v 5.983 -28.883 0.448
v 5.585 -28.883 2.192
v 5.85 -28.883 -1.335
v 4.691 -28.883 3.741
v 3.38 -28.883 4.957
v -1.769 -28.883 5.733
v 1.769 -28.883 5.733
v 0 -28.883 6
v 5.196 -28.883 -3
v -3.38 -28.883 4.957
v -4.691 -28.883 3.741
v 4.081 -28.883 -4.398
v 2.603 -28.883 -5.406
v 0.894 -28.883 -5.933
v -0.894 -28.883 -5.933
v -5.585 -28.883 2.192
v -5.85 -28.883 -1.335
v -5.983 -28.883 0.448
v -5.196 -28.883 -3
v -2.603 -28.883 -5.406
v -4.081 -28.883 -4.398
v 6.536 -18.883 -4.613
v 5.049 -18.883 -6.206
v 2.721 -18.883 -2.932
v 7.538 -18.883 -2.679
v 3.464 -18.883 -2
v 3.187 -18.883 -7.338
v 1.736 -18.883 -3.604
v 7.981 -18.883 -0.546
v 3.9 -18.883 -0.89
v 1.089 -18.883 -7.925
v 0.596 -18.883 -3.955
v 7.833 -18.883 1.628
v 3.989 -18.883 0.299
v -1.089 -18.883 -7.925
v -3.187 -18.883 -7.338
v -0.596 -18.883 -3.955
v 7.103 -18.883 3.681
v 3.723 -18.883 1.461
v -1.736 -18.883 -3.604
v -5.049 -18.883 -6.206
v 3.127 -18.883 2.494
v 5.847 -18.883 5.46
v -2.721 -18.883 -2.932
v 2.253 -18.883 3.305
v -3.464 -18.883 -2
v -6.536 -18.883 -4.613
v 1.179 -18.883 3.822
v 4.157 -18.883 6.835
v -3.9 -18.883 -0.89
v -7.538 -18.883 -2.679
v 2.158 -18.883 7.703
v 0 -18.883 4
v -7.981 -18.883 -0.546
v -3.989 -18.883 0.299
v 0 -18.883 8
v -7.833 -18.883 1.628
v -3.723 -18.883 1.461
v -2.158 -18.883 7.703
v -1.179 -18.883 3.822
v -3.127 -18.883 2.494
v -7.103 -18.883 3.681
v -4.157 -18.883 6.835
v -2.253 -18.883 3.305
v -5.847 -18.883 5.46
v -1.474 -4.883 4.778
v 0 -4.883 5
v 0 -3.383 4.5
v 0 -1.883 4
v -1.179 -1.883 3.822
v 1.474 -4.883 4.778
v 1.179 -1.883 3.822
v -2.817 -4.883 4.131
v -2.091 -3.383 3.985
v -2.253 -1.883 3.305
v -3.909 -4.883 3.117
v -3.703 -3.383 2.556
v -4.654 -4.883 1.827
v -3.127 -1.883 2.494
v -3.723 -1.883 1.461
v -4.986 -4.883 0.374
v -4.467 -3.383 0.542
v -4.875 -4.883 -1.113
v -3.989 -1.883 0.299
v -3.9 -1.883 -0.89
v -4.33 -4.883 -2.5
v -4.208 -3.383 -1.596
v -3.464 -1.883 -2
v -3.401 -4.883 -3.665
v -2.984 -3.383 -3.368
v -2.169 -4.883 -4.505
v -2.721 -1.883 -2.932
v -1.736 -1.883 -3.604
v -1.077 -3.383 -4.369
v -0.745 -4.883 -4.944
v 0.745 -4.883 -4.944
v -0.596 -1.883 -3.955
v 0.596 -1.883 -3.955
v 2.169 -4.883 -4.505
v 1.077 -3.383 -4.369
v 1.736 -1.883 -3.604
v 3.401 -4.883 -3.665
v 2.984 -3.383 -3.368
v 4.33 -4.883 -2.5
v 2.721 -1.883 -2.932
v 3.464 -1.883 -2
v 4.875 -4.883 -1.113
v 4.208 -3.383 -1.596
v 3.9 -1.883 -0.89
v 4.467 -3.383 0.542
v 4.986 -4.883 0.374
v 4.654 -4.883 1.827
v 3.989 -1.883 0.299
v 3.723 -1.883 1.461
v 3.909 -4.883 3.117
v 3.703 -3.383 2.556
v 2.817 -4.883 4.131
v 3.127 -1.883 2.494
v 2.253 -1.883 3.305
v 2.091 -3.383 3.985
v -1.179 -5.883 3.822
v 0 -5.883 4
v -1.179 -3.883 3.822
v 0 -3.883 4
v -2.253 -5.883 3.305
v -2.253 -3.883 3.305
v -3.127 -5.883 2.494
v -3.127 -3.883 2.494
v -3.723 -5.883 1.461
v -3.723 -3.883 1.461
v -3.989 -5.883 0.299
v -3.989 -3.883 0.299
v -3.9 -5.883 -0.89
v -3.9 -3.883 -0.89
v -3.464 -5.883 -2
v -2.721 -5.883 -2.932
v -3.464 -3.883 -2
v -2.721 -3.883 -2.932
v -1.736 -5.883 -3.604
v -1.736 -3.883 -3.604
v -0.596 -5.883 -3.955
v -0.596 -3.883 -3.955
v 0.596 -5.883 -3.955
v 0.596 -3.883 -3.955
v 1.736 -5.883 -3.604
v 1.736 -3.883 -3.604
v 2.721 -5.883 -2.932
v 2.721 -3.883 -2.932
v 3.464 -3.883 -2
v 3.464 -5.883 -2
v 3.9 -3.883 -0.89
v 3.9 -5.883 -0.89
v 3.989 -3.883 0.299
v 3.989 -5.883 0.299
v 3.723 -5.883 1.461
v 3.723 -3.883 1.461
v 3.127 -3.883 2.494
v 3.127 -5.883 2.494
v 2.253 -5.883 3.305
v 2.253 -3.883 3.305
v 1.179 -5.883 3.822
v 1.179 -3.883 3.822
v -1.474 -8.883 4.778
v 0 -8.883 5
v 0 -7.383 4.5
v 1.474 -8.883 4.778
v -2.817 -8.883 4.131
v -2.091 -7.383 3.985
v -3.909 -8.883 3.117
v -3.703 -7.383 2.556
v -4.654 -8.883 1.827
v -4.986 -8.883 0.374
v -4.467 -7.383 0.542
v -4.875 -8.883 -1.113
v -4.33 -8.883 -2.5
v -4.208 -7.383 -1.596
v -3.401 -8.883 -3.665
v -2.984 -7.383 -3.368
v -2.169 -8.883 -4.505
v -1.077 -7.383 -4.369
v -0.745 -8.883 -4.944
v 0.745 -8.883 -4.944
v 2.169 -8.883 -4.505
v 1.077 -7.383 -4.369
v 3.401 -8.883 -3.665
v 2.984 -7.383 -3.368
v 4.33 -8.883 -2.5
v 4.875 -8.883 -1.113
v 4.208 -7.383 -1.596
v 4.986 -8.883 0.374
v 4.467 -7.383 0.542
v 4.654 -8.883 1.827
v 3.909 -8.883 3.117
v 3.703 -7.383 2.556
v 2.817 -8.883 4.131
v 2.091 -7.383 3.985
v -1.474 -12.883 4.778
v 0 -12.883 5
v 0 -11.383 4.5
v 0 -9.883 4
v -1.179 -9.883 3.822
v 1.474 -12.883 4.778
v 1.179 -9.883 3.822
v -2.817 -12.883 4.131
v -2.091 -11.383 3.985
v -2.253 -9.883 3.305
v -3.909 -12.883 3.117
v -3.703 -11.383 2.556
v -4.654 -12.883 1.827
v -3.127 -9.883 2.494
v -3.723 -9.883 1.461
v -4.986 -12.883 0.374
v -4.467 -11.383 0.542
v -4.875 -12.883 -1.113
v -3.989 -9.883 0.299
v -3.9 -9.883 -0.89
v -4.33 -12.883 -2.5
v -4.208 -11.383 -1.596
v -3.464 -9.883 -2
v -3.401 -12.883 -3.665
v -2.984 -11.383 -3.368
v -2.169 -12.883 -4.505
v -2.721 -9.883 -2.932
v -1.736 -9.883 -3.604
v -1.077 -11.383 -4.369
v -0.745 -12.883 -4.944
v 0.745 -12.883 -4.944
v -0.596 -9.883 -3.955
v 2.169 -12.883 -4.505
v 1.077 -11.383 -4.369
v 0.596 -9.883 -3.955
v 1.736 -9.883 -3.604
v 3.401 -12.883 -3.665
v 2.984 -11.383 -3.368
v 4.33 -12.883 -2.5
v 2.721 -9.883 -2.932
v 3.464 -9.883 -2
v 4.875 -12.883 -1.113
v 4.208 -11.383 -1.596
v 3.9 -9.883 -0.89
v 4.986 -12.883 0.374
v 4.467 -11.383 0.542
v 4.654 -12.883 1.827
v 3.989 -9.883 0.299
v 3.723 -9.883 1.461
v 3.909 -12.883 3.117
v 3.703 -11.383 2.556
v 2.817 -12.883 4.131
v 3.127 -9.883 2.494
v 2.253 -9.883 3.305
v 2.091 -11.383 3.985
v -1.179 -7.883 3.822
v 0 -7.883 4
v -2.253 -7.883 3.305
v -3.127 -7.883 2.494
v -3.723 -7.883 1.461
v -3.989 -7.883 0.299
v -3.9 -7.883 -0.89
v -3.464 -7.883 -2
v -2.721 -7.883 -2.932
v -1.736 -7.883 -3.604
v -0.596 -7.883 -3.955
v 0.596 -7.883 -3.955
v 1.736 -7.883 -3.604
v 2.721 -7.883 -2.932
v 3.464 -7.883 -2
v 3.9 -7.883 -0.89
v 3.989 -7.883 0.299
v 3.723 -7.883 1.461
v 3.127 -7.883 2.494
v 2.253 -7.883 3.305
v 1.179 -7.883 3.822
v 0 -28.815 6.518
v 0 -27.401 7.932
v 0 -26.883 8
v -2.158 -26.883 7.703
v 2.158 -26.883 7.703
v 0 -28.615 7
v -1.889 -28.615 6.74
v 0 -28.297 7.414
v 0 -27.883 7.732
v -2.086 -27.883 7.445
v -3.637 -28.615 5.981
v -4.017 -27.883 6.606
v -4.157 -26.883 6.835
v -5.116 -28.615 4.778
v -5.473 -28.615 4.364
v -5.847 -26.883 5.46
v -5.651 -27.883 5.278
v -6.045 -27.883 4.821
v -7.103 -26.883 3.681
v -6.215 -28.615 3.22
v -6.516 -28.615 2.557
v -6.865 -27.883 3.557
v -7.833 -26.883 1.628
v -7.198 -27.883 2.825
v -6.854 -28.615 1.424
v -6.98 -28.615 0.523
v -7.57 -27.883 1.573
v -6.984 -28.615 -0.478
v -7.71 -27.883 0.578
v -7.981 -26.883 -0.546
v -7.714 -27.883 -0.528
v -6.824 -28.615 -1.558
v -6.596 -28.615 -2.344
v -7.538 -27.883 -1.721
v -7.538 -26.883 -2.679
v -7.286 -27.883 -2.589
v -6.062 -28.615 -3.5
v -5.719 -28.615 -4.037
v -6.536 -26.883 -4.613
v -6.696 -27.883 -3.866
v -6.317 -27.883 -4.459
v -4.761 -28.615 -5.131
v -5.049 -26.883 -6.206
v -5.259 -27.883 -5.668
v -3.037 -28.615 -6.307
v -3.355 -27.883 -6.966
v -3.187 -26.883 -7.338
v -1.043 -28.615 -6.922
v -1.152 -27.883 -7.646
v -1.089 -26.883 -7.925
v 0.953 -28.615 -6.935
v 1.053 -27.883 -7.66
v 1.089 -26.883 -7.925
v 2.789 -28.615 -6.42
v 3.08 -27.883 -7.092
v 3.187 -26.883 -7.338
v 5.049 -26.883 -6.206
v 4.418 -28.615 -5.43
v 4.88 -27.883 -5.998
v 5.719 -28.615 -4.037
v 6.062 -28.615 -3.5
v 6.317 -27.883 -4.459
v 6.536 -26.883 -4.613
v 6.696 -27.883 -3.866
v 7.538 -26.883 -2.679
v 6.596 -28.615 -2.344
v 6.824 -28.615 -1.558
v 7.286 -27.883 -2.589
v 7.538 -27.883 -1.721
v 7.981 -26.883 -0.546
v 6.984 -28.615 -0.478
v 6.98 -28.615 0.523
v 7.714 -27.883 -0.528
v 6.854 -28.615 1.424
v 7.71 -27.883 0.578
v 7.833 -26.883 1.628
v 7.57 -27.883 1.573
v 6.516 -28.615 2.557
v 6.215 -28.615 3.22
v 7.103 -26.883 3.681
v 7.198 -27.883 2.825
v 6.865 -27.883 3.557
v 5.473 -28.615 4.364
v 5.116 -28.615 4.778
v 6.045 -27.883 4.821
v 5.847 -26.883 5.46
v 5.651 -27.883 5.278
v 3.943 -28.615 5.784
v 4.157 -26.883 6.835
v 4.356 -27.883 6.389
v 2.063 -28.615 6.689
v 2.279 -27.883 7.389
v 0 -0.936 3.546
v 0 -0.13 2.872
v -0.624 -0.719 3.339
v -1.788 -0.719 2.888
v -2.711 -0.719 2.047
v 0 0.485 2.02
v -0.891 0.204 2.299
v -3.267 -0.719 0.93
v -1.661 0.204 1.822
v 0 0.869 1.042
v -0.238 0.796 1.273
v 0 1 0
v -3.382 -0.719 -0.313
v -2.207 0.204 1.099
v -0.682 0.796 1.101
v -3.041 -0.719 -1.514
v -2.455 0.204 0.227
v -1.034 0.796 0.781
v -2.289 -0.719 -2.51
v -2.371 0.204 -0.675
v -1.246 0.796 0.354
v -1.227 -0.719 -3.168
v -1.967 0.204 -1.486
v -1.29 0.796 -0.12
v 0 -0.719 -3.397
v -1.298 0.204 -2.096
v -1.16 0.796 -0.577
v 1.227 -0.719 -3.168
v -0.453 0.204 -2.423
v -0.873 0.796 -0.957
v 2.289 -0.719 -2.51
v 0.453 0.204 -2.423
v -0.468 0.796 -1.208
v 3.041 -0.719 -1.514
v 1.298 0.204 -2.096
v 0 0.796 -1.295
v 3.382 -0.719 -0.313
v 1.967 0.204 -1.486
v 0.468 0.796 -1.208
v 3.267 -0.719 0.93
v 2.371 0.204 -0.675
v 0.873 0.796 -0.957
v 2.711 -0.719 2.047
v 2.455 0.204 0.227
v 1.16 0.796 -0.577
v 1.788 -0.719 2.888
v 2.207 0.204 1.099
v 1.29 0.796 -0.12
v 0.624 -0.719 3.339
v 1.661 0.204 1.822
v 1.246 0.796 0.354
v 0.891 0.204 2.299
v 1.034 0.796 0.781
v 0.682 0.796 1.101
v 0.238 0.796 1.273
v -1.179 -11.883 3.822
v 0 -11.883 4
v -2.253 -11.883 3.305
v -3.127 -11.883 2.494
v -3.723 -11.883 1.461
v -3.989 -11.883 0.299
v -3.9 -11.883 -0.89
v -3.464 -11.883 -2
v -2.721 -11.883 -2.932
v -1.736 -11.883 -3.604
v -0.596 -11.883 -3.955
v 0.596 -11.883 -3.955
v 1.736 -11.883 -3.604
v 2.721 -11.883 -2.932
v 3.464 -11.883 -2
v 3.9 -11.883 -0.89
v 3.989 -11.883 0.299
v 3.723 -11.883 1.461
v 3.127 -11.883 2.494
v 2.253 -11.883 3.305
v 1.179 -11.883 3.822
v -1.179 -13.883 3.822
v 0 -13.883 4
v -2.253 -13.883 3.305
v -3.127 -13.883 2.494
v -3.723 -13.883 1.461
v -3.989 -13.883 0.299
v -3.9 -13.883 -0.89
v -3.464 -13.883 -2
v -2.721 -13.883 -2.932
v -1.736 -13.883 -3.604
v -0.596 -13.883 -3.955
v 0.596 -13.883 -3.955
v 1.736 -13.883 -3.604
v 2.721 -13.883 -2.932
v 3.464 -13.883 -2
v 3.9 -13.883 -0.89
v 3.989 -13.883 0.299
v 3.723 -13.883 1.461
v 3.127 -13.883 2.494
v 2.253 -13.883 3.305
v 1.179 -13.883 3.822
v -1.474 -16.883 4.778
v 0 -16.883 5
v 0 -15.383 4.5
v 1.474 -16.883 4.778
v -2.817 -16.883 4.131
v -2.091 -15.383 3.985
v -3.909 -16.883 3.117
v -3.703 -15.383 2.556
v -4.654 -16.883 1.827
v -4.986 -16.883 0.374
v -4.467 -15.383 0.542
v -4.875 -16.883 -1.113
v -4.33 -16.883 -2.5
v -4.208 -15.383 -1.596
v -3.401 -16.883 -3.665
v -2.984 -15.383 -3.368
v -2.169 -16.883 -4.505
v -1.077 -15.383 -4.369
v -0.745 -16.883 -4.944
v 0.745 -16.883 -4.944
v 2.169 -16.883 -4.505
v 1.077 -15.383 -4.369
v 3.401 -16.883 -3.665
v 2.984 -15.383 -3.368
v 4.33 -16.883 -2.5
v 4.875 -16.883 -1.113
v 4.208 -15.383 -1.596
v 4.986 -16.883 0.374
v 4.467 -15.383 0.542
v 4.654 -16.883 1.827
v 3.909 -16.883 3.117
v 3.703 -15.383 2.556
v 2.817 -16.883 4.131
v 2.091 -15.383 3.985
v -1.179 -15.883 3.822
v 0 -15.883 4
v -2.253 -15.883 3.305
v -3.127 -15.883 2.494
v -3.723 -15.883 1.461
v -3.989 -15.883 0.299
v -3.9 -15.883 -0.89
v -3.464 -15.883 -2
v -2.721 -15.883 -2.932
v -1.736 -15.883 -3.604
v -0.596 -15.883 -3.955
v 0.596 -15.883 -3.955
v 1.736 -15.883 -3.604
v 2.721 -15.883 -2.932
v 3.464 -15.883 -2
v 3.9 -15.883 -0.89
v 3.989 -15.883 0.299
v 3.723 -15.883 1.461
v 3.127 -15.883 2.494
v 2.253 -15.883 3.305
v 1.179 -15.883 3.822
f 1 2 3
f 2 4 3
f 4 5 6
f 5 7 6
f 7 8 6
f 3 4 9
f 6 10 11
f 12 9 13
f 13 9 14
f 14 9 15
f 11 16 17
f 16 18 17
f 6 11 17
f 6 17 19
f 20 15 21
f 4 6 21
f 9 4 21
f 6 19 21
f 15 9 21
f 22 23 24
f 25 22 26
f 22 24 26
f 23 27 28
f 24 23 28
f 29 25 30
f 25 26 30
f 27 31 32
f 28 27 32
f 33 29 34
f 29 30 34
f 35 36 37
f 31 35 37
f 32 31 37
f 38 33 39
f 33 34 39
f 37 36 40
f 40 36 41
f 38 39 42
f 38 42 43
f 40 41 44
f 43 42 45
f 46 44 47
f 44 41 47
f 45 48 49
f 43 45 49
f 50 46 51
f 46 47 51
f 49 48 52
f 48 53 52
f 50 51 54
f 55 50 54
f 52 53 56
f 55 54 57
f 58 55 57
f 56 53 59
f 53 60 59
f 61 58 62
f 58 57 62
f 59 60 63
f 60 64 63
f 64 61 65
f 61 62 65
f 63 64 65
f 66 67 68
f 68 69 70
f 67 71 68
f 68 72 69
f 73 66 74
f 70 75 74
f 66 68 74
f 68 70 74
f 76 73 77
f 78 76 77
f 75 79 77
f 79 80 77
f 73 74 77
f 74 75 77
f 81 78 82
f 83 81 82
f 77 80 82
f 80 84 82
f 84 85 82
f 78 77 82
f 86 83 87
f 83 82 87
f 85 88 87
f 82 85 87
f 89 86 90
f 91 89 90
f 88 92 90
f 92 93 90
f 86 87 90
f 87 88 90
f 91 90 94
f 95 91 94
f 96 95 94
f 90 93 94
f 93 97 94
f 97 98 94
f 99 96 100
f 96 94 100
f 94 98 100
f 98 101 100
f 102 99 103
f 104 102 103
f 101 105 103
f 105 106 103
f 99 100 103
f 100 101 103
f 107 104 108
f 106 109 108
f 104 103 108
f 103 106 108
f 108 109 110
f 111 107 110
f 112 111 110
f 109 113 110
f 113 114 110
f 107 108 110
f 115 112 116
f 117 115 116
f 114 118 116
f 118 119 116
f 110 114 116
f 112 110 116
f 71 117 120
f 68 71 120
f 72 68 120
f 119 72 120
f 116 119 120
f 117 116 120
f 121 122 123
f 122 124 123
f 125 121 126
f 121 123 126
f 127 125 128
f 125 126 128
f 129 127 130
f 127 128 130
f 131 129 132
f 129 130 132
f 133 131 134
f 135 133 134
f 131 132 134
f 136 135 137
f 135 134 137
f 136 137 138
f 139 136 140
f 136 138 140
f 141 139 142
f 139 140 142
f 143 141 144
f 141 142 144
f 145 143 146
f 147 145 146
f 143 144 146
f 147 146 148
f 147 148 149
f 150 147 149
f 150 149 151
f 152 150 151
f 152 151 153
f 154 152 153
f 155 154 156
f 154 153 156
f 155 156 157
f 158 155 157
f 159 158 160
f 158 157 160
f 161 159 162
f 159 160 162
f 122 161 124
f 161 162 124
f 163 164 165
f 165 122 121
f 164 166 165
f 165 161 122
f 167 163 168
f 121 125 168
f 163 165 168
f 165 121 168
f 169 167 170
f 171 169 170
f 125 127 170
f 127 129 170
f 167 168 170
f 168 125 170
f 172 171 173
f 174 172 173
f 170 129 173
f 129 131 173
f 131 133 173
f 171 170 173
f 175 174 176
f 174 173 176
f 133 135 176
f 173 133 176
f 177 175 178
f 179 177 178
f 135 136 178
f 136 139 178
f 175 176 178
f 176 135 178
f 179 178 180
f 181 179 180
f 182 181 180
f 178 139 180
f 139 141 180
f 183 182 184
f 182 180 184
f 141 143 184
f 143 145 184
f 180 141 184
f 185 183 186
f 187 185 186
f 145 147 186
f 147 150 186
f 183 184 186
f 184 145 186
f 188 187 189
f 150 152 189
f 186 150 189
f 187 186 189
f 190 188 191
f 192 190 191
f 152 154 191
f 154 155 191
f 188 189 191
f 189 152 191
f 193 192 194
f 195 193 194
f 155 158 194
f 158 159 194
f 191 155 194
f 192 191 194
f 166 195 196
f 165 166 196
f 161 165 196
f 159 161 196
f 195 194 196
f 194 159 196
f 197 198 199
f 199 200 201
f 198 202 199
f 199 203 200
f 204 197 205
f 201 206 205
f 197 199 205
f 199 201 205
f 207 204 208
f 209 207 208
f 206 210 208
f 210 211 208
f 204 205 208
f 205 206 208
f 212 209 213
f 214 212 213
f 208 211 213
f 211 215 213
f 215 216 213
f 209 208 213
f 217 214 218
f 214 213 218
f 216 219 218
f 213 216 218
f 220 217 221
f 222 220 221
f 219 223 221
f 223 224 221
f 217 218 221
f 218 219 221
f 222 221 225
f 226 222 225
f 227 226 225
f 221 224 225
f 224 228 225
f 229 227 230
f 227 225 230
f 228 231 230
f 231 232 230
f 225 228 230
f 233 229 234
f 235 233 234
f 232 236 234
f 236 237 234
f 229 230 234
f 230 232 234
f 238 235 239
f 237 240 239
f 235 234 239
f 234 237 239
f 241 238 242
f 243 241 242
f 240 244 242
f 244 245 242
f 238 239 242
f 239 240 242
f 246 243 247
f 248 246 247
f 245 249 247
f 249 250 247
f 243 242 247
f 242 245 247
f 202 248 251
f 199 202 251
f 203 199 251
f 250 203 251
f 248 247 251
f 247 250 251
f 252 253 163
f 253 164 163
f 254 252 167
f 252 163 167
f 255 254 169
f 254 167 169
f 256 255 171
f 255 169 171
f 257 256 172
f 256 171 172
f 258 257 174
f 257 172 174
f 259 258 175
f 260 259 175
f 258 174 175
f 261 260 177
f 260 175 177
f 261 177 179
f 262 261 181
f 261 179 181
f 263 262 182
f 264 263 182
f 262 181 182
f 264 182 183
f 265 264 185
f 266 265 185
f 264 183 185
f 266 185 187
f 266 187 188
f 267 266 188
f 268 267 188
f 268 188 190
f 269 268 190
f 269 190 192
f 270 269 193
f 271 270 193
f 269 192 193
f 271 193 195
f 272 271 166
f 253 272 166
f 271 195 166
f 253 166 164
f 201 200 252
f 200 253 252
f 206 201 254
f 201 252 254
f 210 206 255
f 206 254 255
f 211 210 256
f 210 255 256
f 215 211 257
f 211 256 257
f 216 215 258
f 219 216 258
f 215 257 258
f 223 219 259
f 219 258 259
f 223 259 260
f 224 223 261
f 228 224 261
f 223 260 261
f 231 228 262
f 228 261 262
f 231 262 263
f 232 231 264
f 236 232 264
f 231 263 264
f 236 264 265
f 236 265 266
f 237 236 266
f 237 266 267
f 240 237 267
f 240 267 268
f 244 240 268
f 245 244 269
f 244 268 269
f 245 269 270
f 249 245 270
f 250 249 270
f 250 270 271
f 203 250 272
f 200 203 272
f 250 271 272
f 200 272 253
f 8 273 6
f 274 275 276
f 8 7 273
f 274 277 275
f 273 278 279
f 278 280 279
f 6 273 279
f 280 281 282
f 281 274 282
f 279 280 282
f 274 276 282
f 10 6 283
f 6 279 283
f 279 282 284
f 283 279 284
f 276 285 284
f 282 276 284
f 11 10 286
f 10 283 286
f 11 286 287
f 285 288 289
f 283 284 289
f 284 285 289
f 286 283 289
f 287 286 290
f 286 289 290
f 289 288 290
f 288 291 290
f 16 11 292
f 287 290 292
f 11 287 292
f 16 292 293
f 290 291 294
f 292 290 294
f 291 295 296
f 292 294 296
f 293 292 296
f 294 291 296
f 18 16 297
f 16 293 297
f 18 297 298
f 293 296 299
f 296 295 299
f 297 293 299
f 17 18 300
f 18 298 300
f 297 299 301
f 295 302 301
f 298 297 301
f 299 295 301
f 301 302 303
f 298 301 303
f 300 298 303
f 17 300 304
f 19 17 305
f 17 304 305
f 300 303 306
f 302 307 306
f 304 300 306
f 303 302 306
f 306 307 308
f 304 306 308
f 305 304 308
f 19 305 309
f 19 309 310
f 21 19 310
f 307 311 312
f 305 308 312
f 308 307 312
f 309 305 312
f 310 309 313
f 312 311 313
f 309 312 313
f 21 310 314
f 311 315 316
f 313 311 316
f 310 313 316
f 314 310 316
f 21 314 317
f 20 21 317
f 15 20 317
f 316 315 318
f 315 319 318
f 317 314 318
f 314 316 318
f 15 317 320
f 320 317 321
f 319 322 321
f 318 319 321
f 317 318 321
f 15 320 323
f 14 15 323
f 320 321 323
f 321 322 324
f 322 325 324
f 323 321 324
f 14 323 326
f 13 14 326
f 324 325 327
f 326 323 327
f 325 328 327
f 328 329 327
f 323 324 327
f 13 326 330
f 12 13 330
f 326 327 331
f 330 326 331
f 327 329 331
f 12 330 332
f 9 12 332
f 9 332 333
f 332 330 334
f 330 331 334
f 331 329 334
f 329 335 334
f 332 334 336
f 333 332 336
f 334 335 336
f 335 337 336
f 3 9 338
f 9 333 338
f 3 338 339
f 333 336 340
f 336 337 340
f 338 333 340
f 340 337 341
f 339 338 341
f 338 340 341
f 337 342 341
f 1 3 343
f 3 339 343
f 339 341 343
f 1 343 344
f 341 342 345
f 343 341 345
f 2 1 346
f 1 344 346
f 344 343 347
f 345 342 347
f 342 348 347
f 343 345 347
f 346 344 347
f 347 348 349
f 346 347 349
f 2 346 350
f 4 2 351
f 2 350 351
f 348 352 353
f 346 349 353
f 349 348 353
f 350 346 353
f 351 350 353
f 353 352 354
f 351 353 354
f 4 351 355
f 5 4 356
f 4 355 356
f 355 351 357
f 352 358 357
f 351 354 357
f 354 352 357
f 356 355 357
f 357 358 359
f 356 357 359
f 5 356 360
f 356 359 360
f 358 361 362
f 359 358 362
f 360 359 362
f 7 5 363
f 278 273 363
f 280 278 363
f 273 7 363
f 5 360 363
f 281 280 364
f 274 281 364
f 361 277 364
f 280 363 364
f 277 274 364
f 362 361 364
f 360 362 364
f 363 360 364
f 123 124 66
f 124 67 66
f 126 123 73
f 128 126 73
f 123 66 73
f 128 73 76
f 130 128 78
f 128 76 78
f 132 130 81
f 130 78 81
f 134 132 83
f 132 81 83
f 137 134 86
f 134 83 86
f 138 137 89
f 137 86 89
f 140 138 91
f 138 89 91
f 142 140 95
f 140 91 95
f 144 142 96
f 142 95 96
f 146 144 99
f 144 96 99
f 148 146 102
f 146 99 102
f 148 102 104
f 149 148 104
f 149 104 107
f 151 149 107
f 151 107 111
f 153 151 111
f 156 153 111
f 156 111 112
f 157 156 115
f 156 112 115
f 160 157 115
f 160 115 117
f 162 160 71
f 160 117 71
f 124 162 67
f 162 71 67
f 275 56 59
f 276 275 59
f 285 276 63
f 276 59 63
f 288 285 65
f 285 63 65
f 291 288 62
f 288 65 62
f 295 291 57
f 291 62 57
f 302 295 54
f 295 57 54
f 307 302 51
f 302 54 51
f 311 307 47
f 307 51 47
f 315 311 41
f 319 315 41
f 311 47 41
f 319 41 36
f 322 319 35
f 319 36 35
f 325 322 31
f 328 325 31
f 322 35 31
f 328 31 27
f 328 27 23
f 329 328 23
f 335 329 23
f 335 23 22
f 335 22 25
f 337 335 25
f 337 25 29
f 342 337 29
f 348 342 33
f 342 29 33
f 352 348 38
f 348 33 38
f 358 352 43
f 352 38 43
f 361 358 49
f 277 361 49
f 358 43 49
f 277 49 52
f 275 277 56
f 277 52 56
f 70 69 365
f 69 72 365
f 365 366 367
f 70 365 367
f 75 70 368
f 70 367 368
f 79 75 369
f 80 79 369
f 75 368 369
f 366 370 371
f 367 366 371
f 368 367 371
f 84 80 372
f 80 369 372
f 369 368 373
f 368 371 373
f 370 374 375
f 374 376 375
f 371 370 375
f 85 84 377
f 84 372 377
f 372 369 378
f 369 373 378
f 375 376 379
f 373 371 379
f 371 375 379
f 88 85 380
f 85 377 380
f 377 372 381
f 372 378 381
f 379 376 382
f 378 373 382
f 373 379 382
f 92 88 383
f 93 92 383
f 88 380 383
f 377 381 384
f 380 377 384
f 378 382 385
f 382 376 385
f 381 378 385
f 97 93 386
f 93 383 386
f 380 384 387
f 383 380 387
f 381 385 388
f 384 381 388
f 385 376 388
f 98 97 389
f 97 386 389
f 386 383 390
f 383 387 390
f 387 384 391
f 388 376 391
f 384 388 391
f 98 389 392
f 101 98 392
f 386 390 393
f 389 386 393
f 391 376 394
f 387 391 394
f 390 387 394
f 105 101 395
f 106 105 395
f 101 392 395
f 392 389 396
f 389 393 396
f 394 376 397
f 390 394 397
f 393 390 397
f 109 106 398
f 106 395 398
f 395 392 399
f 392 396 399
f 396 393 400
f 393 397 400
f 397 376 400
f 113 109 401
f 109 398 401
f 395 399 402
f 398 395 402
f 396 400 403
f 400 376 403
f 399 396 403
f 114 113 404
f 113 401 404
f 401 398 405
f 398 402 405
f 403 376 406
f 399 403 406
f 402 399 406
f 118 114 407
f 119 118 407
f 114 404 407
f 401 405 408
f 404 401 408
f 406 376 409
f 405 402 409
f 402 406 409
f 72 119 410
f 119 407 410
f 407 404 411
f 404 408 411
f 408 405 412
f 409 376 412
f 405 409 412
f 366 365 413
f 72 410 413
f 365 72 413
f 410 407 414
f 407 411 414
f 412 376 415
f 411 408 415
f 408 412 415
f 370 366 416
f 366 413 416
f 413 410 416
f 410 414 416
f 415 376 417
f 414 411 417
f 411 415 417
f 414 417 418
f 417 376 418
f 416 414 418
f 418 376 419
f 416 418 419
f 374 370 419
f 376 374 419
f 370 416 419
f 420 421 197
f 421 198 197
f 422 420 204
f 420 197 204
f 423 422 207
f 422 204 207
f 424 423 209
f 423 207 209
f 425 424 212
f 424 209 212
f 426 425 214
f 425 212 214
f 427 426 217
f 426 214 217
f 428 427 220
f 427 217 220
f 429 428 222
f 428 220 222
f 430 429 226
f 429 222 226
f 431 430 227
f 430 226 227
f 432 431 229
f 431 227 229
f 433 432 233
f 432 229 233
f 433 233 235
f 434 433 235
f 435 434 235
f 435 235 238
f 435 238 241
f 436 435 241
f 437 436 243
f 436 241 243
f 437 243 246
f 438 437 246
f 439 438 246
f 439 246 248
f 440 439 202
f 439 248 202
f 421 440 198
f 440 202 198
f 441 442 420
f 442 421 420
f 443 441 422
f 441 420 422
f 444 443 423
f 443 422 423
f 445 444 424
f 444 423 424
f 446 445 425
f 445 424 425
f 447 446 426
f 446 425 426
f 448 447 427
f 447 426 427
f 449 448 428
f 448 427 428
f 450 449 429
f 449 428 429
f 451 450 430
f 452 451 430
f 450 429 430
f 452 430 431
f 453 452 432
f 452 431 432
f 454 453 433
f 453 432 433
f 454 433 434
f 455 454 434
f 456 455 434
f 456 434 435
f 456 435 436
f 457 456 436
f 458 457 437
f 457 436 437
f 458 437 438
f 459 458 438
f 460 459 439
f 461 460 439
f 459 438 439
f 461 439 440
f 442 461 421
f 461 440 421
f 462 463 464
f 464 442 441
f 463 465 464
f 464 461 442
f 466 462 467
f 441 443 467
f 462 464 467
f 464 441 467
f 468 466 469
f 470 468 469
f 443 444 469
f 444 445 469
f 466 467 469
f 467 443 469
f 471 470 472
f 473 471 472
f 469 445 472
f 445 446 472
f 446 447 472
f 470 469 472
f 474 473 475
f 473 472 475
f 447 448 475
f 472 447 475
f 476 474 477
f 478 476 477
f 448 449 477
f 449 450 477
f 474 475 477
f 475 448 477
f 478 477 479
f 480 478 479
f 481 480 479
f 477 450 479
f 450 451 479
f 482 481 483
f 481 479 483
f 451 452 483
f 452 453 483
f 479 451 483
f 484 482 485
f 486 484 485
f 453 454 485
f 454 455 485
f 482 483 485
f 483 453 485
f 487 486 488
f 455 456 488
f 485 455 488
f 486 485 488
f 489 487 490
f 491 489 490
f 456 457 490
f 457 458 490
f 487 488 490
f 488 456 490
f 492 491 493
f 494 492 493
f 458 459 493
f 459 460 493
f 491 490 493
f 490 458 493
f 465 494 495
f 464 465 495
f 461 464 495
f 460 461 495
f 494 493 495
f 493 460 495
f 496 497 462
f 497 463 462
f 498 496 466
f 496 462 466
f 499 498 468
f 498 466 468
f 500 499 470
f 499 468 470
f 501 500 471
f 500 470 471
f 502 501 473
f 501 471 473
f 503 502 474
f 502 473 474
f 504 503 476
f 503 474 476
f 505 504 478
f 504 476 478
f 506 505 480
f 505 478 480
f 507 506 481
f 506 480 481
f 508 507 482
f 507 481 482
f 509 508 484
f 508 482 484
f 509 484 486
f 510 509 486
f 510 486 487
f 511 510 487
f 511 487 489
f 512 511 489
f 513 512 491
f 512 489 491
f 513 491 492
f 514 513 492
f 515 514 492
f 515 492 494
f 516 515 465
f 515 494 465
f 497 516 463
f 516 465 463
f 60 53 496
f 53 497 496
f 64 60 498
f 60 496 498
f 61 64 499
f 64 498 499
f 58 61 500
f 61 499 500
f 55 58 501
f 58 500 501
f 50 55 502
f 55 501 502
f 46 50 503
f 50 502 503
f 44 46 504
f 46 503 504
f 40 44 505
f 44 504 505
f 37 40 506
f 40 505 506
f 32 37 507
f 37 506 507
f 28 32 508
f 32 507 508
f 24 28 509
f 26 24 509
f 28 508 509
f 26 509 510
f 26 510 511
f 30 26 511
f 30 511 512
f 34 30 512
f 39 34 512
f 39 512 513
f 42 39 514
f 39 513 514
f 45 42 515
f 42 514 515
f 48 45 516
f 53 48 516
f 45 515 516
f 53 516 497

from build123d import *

# Parameters (mm, degrees)
FILLET_1_R = 2


with BuildPart() as part:
    # 草图1 → 旋转1 (revolve)
    with BuildSketch(Plane.XY, mode=Mode.PRIVATE) as revolve_1_sk:
        with BuildLine():
            Line((0, 1), (0, -28.88303688))
            Line((0, -28.88303688), (8, -28.88303688))
            Line((8, -28.88303688), (8, -18.88303688))
            Line((8, -18.88303688), (4, -18.88303688))
            Line((4, -18.88303688), (4, -15.88303688))
            Line((4, -15.88303688), (5, -16.88303688))
            Line((5, -16.88303688), (4, -13.88303688))
            Line((4, -13.88303688), (4, -11.88303688))
            Line((4, -11.88303688), (5, -12.88303688))
            Line((5, -12.88303688), (4, -9.88303688))
            Line((4, -9.88303688), (4, -7.88303688))
            Line((4, -7.88303688), (5, -8.88303688))
            Line((5, -8.88303688), (4, -5.88303688))
            Line((4, -5.88303688), (4, -3.88303688))
            Line((4, -3.88303688), (5, -4.88303688))
            Line((5, -4.88303688), (4, -1.88303688))
            ThreePointArc((4, -1.88303688), (2.465355028, 0.204127172), (0, 1))
        make_face()
    revolve(revolve_1_sk.sketch.rotate(Axis((0, 13.407424858, 0), (0, -1, 0)), 90), axis=Axis((0, 13.407424858, 0), (0, -1, 0)))

    # 圆角1
    fillet_1_edges = [part.edges().sort_by_distance(p)[0] for p in [
        (0, -28.88303688, -8),
    ]]
    fillet(fillet_1_edges, radius=FILLET_1_R)


solid = part.part
